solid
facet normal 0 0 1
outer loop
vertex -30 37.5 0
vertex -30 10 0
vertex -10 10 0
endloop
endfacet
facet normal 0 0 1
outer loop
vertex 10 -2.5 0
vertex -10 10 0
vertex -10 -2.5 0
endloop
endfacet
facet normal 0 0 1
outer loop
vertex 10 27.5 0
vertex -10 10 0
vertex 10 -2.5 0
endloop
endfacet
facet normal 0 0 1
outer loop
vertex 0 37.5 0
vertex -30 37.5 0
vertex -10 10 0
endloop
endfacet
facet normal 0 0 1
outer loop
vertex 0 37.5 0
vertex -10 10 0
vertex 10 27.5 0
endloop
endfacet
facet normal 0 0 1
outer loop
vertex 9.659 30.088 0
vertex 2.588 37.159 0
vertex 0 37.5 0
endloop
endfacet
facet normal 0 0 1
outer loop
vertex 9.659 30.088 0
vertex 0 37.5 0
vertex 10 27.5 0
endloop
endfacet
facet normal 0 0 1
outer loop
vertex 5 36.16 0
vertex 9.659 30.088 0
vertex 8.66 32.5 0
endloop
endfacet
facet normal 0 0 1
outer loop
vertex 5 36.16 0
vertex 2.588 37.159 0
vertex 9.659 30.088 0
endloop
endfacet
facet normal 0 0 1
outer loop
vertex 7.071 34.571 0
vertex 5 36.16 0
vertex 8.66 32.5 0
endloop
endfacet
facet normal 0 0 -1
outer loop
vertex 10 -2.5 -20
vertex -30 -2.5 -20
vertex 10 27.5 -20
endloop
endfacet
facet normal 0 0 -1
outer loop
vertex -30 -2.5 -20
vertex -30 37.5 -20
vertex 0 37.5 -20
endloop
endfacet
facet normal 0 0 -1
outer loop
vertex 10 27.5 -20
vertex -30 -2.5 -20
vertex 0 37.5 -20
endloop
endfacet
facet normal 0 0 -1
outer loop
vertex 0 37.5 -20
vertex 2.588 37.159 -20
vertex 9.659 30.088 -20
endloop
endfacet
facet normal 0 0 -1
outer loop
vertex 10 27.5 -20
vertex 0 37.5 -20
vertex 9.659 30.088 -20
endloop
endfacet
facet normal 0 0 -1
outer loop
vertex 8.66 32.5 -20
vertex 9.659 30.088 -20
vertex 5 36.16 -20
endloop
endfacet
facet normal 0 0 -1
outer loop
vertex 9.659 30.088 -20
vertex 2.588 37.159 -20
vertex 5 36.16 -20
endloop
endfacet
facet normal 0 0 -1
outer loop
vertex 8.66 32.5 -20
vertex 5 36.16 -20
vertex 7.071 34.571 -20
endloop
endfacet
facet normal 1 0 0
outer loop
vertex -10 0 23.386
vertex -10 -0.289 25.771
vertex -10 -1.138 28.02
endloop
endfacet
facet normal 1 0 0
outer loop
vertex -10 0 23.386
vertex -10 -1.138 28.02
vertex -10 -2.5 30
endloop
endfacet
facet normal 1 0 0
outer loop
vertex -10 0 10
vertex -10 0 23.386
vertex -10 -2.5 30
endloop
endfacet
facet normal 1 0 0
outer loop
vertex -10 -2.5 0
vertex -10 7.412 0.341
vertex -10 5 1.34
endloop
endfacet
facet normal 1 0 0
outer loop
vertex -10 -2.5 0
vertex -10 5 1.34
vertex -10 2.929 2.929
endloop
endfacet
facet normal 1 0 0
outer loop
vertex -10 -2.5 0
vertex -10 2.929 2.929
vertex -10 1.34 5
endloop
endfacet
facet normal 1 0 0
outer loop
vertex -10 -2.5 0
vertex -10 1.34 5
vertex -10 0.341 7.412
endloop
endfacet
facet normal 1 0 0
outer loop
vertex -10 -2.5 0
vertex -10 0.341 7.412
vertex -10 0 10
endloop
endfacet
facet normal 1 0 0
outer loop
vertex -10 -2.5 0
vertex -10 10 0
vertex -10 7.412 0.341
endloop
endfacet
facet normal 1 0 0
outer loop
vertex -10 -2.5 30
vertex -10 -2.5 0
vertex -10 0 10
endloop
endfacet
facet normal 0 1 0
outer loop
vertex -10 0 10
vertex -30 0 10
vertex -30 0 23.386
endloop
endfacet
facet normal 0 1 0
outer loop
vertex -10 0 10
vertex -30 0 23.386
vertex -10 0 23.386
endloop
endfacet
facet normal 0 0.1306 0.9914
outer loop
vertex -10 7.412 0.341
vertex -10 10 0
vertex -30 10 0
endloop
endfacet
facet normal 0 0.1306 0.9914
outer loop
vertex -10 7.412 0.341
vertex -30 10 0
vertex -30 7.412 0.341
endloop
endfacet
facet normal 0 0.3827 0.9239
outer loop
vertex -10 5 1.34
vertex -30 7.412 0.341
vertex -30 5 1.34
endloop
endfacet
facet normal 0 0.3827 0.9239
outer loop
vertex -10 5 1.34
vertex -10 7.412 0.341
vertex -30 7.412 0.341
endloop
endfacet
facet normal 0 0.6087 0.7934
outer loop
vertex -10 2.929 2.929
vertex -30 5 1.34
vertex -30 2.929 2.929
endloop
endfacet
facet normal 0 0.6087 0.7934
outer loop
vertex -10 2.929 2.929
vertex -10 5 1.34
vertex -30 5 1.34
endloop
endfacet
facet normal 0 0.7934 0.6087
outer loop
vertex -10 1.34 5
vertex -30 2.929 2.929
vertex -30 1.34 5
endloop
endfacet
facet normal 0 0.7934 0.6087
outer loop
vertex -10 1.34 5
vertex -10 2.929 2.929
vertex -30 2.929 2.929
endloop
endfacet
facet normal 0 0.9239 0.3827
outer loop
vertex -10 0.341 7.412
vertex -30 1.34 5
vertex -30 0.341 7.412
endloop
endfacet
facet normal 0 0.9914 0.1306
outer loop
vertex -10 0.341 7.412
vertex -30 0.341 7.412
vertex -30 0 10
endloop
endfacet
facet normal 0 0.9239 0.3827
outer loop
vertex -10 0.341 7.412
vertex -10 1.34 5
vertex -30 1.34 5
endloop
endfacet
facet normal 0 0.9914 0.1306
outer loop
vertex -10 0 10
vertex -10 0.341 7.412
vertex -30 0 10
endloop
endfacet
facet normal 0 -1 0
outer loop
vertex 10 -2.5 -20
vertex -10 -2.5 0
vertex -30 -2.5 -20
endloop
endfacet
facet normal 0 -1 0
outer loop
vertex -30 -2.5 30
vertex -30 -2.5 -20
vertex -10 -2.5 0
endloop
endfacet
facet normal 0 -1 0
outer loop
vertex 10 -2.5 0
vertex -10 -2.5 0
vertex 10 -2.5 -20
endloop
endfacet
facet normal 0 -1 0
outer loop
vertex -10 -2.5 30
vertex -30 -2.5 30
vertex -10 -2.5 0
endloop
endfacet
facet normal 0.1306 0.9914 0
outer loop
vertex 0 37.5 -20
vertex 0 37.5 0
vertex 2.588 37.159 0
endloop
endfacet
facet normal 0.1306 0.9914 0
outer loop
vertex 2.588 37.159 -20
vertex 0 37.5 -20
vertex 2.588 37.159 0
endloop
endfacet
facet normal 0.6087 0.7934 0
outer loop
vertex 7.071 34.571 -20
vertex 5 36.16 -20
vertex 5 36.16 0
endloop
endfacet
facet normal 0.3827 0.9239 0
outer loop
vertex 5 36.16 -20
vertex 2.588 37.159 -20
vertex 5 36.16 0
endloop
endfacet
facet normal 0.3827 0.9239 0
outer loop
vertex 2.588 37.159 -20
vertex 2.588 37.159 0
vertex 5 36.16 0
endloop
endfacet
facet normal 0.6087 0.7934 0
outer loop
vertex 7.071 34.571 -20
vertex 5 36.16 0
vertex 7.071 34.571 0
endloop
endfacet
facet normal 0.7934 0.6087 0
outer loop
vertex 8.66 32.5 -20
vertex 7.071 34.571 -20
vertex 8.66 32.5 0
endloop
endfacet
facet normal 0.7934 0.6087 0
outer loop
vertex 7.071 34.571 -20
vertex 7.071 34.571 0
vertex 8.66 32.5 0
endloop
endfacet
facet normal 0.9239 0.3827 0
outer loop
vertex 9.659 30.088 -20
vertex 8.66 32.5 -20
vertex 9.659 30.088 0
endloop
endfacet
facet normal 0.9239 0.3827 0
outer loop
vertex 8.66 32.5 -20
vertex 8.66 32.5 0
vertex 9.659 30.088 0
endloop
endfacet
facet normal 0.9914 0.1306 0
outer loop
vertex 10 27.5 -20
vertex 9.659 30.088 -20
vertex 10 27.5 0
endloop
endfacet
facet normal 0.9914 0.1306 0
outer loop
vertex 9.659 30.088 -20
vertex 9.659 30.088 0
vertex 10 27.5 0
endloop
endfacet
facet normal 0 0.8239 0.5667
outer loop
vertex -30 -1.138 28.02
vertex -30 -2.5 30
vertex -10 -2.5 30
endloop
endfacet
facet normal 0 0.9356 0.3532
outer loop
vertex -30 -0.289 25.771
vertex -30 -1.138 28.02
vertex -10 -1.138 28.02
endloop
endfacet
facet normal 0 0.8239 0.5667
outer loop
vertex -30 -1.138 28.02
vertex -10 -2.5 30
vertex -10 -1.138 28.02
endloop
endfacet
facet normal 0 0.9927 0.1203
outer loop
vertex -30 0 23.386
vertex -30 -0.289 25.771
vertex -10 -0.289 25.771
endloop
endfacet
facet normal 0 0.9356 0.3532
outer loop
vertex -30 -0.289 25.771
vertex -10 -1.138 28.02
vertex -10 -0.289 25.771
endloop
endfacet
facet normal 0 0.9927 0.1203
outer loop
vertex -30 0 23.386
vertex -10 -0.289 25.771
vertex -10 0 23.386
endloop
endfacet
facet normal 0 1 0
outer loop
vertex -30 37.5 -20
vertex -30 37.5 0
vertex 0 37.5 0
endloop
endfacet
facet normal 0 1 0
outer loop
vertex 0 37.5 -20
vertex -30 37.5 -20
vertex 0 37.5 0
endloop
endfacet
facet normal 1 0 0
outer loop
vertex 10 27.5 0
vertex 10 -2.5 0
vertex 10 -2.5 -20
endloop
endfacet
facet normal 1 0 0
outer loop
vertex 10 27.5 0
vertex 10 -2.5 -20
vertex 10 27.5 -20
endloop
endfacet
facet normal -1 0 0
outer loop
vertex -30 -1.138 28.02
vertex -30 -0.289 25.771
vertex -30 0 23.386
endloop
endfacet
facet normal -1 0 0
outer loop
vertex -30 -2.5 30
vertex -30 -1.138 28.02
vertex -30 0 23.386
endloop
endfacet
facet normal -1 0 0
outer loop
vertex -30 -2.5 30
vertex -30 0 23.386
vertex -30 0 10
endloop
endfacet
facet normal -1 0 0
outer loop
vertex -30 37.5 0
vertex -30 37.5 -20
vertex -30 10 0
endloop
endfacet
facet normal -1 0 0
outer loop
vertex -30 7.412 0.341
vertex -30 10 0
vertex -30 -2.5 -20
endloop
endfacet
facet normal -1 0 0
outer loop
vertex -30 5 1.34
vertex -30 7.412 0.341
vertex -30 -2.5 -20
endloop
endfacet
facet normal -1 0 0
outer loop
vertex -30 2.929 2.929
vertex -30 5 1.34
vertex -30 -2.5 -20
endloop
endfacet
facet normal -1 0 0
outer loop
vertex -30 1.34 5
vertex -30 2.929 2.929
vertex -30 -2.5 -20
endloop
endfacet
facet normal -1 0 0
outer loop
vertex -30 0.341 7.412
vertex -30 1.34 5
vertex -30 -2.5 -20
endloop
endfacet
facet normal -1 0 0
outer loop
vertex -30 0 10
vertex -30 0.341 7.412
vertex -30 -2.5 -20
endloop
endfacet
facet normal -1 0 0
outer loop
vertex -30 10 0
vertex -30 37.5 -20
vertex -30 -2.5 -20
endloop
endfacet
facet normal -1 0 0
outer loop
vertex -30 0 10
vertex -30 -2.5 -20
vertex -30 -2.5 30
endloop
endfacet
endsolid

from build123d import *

# Parameters (mm, degrees)
SKETCH1_W           = 20
SKETCH1_H           = 2.5
BOSS_EXTRUDE1_DEPTH = 30
SKETCH2_W           = 40
SKETCH2_H           = 40
BOSS_EXTRUDE2_DEPTH = 20
FILLET1_R           = 10


with BuildPart() as part:
    # Sketch1 → Boss-Extrude1 (new body)
    with BuildSketch(Plane.XY):
        with Locations((-20, -1.25)):
            Rectangle(SKETCH1_W, SKETCH1_H)
    extrude(amount=BOSS_EXTRUDE1_DEPTH)

    # Sketch2 → Boss-Extrude2 (add)
    with BuildSketch(Plane.XY):
        with Locations((-10, 17.5)):
            Rectangle(SKETCH2_W, SKETCH2_H)
    extrude(amount=-BOSS_EXTRUDE2_DEPTH)

    # Fillet1
    # the kernel refuses this fillet: 10 mm, written as the material it adds along each edge
    with BuildSketch(Plane(origin=(-10, 0, 0), x_dir=(0, 1, 0), z_dir=(-1, 0, 0))) as fillet1_piece_1:
        with BuildLine():
            CenterArc((FILLET1_R, -FILLET1_R), FILLET1_R, 90, 90)
            Line((0, -FILLET1_R), (0, 0))
            Line((0, 0), (FILLET1_R, 0))
        make_face()
    extrude(amount=20)
    # the kernel refuses this fillet: 10 mm, written as the material it takes off along each edge
    with BuildSketch(Plane(origin=(10, 37.5, 25), x_dir=(-1, 0, 0), z_dir=(0, 0, -1))) as fillet1_2_piece_1:
        with BuildLine():
            CenterArc((FILLET1_R, -FILLET1_R), FILLET1_R, 90, 90)
            Line((0, -FILLET1_R), (0, 0))
            Line((0, 0), (FILLET1_R, 0))
        make_face()
    extrude(amount=70, mode=Mode.SUBTRACT)
    with BuildSketch(Plane(origin=(6.535945694, 0, 30), x_dir=(0, 0, -1), z_dir=(-1, 0, 0))) as fillet1_2_piece_2:
        with BuildLine():
            CenterArc((6.614378278, 10), FILLET1_R, 228.590377891, 41.409622109)
            Line((0, 2.5), (0, 0))
            Line((0, 0), (6.614378278, 0))
        make_face()
    extrude(amount=53.071891388, mode=Mode.SUBTRACT)


solid = part.part
